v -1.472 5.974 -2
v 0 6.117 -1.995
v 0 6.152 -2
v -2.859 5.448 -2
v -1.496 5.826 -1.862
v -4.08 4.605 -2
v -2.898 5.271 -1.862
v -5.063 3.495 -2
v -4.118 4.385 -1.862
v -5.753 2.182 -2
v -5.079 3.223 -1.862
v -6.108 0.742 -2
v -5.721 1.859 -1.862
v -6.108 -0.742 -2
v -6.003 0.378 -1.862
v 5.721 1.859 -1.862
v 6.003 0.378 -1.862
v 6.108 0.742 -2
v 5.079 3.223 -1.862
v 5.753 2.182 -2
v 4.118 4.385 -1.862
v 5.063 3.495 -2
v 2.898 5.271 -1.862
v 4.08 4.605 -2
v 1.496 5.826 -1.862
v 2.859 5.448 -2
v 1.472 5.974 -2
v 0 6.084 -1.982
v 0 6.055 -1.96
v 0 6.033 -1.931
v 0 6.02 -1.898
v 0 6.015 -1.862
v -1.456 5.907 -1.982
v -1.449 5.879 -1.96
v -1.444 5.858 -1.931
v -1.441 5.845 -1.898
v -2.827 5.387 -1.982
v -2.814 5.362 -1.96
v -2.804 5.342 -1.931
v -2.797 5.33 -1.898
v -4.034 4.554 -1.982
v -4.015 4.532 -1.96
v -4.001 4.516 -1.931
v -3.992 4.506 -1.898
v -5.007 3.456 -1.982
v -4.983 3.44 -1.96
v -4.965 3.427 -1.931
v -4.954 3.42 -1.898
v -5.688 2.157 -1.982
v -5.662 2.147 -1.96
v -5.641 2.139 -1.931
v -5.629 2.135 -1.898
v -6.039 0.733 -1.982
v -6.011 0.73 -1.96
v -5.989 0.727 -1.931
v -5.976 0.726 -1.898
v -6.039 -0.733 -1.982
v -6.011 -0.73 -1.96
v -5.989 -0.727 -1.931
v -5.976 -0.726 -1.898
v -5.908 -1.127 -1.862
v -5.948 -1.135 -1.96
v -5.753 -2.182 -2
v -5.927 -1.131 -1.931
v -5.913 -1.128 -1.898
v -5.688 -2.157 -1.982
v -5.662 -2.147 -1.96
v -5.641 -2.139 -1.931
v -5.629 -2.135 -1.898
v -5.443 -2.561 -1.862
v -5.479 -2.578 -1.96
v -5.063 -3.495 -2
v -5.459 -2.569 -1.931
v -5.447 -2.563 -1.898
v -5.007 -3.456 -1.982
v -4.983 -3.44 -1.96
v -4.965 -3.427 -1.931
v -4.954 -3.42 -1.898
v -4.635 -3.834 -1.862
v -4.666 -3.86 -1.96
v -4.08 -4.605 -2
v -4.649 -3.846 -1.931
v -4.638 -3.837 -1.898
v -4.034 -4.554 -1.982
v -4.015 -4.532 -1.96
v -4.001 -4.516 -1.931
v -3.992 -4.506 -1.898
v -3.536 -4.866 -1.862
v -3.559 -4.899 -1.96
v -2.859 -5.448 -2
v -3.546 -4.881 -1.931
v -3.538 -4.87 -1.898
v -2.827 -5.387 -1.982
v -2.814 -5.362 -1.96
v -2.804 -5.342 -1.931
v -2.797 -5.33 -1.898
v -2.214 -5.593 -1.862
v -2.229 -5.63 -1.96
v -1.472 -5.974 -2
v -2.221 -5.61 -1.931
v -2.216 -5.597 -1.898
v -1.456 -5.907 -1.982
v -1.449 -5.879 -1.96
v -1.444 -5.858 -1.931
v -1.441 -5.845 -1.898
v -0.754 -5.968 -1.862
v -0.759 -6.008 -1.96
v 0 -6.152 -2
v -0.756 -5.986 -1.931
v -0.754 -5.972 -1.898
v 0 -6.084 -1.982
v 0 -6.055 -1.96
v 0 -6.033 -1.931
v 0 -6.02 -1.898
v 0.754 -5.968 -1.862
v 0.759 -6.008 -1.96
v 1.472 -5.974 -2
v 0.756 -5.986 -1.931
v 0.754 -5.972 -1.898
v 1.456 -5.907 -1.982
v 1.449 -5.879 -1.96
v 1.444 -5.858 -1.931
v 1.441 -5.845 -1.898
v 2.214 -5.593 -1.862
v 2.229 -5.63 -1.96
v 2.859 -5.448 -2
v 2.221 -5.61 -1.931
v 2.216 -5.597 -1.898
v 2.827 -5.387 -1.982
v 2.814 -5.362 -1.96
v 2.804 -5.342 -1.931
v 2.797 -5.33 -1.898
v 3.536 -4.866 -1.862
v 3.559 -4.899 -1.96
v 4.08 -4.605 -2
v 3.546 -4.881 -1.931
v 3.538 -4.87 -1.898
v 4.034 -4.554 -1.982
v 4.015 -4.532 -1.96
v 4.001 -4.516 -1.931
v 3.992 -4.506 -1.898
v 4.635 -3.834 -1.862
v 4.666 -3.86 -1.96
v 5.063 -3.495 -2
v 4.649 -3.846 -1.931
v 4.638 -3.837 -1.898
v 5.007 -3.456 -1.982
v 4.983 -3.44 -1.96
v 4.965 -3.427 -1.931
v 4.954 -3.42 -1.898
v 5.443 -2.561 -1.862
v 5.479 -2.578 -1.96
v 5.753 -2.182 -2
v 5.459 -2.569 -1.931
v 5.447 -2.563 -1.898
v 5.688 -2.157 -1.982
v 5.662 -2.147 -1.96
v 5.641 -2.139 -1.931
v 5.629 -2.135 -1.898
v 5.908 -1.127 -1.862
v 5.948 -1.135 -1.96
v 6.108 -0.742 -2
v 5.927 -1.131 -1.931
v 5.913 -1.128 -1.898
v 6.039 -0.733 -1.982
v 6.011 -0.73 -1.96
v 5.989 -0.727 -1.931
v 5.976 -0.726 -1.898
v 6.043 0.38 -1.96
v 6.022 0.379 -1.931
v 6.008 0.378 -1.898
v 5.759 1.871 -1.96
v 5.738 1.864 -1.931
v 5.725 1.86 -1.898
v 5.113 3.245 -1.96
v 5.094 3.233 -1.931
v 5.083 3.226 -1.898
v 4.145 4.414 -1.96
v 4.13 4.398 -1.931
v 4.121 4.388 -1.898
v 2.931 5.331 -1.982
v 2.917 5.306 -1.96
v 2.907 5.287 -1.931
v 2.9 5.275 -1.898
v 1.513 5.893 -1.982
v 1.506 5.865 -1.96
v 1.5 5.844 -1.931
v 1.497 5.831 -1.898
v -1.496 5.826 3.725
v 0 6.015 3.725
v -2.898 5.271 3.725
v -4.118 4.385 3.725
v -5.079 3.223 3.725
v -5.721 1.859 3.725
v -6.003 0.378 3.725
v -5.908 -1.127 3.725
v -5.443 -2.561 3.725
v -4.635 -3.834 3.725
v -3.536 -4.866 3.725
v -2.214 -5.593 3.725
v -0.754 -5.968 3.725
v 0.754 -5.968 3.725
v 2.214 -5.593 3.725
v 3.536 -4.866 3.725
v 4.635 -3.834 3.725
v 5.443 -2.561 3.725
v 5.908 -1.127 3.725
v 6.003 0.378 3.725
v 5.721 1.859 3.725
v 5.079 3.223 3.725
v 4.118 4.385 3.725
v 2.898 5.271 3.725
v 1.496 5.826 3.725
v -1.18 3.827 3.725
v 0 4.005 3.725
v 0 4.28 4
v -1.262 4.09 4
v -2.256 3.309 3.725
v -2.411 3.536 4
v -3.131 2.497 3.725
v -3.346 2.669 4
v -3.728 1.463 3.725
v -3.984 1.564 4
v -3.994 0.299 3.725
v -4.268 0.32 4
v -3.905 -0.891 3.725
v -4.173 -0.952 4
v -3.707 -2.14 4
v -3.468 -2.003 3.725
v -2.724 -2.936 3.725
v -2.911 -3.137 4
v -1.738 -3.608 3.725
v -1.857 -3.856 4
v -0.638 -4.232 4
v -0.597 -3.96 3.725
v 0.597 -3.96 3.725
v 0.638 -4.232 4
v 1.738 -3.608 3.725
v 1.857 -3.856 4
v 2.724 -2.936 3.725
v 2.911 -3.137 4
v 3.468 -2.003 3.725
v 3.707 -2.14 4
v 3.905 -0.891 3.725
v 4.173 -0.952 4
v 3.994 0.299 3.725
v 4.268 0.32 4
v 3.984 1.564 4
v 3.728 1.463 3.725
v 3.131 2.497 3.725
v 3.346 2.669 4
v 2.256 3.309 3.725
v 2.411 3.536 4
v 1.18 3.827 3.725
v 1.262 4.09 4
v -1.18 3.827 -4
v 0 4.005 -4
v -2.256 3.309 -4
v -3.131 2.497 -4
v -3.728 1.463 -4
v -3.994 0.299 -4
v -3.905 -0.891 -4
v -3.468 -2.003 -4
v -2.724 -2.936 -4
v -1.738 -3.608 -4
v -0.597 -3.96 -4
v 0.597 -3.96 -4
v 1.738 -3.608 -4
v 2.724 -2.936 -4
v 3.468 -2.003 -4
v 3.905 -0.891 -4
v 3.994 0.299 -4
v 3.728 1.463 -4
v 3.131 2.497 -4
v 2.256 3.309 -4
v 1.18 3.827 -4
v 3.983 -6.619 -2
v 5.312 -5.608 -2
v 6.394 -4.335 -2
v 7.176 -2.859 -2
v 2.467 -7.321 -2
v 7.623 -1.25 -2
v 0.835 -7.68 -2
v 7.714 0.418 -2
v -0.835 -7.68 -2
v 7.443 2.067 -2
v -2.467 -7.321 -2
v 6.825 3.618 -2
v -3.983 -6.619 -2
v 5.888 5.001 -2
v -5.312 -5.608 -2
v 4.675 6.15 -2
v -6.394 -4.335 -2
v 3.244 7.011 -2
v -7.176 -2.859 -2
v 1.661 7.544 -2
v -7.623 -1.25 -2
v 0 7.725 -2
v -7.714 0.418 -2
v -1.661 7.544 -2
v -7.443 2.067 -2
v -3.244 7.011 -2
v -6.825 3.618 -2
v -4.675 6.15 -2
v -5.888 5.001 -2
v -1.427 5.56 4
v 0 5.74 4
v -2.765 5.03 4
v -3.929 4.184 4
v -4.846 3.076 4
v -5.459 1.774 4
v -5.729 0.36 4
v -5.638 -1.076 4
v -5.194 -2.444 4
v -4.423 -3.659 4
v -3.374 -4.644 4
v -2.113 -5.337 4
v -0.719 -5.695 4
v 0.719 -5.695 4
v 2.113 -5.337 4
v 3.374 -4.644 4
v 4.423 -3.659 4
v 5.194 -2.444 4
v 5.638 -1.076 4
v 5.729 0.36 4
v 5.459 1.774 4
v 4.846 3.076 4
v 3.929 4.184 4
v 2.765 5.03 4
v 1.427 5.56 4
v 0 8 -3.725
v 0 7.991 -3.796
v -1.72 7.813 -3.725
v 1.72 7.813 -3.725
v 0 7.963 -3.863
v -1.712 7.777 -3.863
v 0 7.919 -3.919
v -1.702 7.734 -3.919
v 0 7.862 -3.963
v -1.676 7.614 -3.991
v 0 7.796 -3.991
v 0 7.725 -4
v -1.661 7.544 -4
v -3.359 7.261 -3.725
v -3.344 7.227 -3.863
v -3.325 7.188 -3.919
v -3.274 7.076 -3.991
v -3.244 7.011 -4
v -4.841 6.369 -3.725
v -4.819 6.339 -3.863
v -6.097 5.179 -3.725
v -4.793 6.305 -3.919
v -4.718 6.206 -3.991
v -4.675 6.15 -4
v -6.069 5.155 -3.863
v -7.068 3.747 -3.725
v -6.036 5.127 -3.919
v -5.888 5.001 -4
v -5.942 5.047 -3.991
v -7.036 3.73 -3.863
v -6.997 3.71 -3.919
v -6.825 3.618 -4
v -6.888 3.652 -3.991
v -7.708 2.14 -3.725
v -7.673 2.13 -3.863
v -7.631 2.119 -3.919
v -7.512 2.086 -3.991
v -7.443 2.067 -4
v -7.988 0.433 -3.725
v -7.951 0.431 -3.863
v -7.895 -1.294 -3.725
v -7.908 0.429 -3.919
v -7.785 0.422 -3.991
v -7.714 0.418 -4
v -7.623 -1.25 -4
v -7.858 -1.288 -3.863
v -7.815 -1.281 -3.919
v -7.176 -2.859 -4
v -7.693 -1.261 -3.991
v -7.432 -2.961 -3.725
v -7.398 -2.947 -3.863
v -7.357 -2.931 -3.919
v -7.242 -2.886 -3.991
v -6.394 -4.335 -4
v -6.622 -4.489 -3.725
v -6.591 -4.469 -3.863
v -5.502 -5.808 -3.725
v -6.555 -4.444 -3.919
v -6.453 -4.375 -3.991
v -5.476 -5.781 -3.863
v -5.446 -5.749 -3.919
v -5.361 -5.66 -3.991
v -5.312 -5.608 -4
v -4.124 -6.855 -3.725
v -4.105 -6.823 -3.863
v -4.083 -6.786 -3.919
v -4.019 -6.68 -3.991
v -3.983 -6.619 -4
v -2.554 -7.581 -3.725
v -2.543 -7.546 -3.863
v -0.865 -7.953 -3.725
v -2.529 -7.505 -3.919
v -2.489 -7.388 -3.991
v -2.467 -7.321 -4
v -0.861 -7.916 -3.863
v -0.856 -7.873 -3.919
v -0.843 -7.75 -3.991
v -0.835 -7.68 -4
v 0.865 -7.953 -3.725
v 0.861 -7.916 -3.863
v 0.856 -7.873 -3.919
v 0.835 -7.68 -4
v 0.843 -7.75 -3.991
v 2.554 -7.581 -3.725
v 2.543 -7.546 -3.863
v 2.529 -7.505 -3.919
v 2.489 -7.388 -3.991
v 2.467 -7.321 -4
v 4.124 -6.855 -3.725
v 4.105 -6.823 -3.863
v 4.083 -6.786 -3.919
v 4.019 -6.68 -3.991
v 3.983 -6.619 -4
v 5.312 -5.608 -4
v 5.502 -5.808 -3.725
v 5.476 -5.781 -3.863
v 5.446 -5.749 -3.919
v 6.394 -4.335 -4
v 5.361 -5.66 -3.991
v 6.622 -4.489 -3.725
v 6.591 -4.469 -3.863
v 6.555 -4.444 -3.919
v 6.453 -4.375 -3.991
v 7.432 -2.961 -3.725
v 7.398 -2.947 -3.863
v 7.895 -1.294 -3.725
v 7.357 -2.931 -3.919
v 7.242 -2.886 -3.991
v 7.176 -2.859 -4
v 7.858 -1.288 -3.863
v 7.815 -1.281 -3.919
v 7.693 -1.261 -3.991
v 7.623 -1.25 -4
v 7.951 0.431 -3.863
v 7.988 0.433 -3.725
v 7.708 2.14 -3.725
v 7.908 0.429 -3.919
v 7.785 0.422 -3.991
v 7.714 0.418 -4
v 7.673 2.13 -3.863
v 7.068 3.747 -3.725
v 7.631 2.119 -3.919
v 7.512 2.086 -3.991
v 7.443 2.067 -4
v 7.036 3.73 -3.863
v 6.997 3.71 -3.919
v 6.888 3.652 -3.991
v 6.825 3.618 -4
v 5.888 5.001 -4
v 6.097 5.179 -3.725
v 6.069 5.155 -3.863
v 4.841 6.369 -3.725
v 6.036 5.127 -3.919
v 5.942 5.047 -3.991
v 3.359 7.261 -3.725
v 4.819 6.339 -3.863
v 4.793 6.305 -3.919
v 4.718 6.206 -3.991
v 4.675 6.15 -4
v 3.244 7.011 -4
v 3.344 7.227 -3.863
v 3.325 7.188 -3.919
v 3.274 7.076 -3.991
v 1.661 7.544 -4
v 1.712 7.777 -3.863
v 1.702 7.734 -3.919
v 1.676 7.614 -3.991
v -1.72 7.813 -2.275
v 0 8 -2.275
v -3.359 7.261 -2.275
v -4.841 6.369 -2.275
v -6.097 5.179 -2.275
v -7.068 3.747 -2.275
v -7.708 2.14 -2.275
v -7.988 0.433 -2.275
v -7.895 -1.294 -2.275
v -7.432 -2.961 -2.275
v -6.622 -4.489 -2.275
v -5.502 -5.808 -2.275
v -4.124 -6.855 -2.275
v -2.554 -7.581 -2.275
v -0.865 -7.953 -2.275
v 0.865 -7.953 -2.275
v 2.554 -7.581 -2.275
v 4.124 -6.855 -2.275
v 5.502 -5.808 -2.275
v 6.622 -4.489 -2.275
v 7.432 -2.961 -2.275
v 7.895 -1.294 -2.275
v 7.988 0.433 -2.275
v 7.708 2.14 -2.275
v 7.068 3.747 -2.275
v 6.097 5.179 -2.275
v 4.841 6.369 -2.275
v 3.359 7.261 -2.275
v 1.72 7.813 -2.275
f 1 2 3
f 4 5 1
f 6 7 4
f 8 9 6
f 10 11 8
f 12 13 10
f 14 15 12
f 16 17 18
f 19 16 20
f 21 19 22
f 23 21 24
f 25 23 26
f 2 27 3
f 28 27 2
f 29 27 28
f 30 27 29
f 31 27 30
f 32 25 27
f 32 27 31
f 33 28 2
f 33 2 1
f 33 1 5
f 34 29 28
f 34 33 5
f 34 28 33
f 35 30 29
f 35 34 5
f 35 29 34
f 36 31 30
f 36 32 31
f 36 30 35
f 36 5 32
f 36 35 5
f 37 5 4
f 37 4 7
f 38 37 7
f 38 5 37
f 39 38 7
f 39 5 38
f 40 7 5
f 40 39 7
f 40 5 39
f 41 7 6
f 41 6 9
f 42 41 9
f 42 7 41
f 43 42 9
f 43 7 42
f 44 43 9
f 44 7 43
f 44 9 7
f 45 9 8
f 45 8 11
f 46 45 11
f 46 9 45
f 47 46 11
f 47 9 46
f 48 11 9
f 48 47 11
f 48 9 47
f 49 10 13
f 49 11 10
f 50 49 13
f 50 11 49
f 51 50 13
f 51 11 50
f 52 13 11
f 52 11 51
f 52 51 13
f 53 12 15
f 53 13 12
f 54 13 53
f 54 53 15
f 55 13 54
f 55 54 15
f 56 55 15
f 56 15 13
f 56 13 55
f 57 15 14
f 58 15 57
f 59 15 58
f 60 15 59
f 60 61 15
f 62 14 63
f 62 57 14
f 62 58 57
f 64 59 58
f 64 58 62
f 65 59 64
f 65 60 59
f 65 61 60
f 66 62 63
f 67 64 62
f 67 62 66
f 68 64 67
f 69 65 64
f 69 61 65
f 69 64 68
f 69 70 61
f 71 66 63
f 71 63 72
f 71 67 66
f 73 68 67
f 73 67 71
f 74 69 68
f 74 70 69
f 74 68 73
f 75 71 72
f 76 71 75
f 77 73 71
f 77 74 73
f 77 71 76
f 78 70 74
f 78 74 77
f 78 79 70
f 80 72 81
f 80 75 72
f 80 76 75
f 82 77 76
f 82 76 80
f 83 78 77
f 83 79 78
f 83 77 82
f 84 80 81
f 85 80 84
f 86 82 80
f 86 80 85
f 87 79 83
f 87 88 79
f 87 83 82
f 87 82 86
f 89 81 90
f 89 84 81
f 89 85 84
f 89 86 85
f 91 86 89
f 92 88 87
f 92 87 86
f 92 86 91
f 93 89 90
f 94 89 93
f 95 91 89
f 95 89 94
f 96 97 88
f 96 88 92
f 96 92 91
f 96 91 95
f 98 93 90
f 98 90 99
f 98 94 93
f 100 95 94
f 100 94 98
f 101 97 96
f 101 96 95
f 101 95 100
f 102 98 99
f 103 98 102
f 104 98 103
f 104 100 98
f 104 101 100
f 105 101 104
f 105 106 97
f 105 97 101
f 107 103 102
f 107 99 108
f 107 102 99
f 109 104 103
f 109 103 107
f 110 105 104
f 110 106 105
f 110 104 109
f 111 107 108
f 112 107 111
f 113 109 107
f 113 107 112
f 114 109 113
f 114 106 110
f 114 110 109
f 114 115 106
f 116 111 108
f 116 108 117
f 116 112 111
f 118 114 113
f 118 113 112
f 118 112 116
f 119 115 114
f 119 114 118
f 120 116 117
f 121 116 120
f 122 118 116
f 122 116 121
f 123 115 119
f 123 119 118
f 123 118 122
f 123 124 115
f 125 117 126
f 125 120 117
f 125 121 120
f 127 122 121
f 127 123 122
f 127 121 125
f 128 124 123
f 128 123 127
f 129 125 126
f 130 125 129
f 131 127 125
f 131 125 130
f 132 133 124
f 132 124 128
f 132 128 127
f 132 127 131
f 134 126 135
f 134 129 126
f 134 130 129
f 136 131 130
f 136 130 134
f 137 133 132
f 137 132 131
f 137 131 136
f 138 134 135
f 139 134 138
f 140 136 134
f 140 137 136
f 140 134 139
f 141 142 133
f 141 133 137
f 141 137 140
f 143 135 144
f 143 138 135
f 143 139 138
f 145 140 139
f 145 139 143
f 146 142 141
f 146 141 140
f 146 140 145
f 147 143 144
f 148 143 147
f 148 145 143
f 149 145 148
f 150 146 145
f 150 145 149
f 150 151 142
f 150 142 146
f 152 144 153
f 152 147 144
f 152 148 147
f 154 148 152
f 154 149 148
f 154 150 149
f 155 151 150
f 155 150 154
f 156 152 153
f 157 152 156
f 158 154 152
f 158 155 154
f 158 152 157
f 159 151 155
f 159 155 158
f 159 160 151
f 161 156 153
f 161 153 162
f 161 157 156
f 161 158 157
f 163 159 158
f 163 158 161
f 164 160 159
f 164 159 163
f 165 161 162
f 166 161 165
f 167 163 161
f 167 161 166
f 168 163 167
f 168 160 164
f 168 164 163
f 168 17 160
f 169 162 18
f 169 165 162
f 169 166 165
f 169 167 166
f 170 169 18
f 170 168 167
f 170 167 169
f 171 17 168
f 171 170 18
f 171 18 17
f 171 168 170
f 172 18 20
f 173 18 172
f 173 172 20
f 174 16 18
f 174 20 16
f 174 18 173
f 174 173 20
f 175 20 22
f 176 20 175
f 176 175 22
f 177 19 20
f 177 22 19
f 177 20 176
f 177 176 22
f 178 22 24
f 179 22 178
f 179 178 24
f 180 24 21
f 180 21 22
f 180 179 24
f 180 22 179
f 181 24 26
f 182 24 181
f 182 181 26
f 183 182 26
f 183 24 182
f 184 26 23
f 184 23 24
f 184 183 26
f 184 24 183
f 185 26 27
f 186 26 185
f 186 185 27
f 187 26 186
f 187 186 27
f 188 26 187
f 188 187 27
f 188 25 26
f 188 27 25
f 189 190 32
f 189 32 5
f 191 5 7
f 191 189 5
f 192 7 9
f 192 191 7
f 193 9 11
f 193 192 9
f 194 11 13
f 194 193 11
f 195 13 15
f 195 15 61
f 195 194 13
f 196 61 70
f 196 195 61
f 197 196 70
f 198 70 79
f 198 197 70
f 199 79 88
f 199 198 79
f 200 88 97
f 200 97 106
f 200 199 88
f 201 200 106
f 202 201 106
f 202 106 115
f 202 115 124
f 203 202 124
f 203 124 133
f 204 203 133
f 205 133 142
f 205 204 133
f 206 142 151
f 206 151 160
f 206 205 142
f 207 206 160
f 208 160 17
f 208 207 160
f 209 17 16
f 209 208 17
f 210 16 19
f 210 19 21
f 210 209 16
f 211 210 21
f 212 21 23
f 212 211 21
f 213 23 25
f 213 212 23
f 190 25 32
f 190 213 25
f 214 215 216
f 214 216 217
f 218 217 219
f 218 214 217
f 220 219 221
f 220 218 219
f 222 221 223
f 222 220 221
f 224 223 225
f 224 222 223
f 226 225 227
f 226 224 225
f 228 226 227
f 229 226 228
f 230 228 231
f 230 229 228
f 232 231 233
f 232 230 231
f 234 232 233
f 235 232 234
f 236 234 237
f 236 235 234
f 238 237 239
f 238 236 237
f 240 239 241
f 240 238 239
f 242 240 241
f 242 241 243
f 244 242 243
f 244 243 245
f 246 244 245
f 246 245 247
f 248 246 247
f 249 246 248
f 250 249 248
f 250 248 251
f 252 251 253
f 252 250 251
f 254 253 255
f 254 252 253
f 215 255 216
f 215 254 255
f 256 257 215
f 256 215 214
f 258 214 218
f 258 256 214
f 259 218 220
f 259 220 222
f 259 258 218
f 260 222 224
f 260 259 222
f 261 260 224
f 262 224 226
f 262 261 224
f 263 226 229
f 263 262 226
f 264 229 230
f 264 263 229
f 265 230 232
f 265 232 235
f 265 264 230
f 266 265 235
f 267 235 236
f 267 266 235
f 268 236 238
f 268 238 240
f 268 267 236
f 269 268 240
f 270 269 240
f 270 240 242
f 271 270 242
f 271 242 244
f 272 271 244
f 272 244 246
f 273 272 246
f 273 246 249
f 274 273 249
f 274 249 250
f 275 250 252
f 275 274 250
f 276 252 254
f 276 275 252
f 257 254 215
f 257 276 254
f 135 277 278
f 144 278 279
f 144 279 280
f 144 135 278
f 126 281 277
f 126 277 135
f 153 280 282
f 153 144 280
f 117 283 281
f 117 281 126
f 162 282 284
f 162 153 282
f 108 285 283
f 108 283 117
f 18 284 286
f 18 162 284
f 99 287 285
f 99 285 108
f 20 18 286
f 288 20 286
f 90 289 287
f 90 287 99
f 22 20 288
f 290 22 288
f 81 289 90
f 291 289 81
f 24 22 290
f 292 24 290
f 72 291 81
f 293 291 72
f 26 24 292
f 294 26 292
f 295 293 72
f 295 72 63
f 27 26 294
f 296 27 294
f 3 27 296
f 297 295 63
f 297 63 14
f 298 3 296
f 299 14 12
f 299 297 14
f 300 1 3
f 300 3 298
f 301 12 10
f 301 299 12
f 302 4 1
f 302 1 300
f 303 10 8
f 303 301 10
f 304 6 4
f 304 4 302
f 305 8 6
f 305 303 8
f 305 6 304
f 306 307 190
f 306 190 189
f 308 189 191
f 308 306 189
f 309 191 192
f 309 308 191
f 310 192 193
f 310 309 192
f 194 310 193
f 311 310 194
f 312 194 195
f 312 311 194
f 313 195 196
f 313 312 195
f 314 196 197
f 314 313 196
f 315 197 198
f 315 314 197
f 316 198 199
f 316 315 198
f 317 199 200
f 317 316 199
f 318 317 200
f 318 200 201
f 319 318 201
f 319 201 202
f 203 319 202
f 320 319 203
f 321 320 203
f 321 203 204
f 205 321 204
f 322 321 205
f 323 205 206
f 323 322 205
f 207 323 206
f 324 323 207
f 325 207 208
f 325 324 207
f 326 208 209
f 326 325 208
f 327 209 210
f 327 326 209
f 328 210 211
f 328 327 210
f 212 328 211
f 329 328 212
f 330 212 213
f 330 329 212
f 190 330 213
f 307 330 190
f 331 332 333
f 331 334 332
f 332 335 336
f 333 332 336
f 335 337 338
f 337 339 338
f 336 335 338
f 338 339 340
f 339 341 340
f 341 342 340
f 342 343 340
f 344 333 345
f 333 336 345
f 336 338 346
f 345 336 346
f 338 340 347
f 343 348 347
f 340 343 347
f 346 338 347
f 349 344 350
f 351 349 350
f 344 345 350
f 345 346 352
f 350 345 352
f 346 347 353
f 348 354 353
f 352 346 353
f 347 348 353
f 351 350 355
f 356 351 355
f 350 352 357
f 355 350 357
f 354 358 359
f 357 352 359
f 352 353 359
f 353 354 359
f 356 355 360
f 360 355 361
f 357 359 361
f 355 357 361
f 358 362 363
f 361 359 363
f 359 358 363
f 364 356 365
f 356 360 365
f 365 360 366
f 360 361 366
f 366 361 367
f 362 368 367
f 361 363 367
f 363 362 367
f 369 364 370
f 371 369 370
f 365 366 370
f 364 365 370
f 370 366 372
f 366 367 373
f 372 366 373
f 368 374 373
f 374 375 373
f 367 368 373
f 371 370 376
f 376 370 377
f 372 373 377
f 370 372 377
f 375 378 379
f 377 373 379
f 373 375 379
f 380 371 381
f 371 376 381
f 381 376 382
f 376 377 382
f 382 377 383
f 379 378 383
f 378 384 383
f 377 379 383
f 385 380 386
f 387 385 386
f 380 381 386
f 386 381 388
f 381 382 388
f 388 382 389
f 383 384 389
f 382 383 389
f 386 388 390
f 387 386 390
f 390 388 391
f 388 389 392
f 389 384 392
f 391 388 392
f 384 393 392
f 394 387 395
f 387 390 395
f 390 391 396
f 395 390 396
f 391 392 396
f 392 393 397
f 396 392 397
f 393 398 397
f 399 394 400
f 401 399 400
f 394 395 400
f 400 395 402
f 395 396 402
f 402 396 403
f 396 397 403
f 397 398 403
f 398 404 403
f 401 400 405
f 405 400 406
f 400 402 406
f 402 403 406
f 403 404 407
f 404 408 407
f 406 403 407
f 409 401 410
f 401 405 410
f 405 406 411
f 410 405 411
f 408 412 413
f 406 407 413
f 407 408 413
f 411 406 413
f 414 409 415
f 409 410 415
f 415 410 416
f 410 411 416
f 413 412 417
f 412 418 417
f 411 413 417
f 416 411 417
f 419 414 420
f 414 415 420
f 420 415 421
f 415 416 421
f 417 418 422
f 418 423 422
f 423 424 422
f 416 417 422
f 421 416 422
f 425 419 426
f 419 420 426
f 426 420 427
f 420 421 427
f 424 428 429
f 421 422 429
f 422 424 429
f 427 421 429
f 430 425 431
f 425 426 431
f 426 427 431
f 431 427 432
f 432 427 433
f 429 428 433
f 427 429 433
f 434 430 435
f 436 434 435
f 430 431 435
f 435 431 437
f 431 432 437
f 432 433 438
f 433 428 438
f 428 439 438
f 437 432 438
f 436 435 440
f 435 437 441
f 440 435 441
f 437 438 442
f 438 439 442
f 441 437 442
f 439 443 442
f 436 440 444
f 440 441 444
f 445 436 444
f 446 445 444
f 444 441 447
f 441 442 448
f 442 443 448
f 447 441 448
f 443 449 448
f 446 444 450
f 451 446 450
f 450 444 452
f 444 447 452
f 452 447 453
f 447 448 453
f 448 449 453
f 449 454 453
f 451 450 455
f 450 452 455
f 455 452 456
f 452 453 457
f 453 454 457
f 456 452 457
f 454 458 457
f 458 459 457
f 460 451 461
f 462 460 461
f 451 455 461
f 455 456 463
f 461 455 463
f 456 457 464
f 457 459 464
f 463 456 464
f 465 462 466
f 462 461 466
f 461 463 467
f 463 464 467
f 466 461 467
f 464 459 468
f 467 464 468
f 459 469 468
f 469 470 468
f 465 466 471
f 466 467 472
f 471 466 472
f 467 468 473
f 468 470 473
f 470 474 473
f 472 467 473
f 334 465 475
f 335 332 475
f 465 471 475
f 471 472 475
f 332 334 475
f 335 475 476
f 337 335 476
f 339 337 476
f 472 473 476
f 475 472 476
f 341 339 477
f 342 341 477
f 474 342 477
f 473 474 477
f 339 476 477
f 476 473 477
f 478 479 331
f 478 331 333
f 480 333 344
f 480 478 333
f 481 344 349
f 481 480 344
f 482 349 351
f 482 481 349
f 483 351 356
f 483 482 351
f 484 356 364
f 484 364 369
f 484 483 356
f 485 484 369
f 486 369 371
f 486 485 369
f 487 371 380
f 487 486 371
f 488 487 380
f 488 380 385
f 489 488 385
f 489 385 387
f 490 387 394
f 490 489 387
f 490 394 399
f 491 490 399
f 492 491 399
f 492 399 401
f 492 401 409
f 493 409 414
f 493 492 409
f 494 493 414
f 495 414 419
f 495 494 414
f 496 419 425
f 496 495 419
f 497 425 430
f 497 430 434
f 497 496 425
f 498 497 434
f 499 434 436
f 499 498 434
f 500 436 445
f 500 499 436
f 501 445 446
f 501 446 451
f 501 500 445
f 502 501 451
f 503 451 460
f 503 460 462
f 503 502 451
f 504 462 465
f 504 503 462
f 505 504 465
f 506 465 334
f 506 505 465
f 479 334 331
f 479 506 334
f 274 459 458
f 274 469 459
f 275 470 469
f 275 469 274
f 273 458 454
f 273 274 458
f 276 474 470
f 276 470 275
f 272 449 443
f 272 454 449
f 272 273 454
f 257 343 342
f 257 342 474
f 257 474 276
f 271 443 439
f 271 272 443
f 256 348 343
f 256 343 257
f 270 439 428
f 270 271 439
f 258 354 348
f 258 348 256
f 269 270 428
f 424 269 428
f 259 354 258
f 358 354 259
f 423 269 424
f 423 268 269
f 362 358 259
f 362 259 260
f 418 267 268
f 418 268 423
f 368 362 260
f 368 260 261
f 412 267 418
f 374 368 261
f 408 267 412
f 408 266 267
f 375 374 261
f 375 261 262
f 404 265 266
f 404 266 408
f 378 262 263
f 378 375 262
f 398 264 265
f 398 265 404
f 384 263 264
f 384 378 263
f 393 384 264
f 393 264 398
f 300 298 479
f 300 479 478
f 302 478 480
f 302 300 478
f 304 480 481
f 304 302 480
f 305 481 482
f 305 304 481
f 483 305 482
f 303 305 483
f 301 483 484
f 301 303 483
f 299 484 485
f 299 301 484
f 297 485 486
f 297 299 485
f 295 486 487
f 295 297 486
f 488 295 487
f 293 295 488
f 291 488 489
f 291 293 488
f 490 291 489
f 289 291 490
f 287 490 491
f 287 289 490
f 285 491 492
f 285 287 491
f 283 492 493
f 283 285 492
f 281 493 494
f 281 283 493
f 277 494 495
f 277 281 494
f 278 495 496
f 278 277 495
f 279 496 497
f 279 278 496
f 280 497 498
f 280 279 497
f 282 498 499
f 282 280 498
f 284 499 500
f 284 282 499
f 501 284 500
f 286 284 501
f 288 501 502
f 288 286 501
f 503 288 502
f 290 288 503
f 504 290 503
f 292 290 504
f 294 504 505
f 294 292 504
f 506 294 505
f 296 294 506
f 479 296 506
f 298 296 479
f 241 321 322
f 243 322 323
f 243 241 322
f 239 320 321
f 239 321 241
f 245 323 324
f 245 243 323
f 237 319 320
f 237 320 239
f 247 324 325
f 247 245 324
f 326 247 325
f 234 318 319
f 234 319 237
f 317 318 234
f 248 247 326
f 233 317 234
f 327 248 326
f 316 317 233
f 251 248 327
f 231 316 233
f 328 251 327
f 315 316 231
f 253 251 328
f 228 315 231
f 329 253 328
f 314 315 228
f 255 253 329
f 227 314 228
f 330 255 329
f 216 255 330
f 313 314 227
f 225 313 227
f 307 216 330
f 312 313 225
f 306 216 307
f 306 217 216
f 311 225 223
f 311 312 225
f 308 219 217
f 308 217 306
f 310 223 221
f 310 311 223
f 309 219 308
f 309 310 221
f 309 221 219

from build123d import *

# Parameters (mm, degrees)
CHAMFER1_SIZE = 0.275
FILLET1_R     = 0.275
FILLET2_R     = 0.1375


with BuildPart() as part:
    # Sketch3 → Revolve1 (revolve)
    with BuildSketch(Plane(origin=(0, 0, 0), x_dir=(0, 0, -1), z_dir=(1, 0, 0))):
        Polygon((4, 8), (2, 8), (2, 6.015), (-4, 6.015), (-4, 4.005), (4, 4.005), align=None)
    revolve(axis=Axis((0, 0, -4), (0, 0, 1)))

    # Chamfer1
    chamfer1_edges = [part.edges().sort_by_distance(p)[0] for p in [
        (0, -4.005, 4),
        (0, -6.015, 4),
        (0, -8, -2),
    ]]
    chamfer(chamfer1_edges, length=CHAMFER1_SIZE)

    # Fillet1
    fillet1_edges = [part.edges().sort_by_distance(p)[0] for p in [
        (0, -8, -4),
    ]]
    fillet(fillet1_edges, radius=FILLET1_R)

    # Fillet2
    fillet2_edges = [part.edges().sort_by_distance(p)[0] for p in [
        (0, -6.015, -2),
    ]]
    fillet(fillet2_edges, radius=FILLET2_R)


solid = part.part
